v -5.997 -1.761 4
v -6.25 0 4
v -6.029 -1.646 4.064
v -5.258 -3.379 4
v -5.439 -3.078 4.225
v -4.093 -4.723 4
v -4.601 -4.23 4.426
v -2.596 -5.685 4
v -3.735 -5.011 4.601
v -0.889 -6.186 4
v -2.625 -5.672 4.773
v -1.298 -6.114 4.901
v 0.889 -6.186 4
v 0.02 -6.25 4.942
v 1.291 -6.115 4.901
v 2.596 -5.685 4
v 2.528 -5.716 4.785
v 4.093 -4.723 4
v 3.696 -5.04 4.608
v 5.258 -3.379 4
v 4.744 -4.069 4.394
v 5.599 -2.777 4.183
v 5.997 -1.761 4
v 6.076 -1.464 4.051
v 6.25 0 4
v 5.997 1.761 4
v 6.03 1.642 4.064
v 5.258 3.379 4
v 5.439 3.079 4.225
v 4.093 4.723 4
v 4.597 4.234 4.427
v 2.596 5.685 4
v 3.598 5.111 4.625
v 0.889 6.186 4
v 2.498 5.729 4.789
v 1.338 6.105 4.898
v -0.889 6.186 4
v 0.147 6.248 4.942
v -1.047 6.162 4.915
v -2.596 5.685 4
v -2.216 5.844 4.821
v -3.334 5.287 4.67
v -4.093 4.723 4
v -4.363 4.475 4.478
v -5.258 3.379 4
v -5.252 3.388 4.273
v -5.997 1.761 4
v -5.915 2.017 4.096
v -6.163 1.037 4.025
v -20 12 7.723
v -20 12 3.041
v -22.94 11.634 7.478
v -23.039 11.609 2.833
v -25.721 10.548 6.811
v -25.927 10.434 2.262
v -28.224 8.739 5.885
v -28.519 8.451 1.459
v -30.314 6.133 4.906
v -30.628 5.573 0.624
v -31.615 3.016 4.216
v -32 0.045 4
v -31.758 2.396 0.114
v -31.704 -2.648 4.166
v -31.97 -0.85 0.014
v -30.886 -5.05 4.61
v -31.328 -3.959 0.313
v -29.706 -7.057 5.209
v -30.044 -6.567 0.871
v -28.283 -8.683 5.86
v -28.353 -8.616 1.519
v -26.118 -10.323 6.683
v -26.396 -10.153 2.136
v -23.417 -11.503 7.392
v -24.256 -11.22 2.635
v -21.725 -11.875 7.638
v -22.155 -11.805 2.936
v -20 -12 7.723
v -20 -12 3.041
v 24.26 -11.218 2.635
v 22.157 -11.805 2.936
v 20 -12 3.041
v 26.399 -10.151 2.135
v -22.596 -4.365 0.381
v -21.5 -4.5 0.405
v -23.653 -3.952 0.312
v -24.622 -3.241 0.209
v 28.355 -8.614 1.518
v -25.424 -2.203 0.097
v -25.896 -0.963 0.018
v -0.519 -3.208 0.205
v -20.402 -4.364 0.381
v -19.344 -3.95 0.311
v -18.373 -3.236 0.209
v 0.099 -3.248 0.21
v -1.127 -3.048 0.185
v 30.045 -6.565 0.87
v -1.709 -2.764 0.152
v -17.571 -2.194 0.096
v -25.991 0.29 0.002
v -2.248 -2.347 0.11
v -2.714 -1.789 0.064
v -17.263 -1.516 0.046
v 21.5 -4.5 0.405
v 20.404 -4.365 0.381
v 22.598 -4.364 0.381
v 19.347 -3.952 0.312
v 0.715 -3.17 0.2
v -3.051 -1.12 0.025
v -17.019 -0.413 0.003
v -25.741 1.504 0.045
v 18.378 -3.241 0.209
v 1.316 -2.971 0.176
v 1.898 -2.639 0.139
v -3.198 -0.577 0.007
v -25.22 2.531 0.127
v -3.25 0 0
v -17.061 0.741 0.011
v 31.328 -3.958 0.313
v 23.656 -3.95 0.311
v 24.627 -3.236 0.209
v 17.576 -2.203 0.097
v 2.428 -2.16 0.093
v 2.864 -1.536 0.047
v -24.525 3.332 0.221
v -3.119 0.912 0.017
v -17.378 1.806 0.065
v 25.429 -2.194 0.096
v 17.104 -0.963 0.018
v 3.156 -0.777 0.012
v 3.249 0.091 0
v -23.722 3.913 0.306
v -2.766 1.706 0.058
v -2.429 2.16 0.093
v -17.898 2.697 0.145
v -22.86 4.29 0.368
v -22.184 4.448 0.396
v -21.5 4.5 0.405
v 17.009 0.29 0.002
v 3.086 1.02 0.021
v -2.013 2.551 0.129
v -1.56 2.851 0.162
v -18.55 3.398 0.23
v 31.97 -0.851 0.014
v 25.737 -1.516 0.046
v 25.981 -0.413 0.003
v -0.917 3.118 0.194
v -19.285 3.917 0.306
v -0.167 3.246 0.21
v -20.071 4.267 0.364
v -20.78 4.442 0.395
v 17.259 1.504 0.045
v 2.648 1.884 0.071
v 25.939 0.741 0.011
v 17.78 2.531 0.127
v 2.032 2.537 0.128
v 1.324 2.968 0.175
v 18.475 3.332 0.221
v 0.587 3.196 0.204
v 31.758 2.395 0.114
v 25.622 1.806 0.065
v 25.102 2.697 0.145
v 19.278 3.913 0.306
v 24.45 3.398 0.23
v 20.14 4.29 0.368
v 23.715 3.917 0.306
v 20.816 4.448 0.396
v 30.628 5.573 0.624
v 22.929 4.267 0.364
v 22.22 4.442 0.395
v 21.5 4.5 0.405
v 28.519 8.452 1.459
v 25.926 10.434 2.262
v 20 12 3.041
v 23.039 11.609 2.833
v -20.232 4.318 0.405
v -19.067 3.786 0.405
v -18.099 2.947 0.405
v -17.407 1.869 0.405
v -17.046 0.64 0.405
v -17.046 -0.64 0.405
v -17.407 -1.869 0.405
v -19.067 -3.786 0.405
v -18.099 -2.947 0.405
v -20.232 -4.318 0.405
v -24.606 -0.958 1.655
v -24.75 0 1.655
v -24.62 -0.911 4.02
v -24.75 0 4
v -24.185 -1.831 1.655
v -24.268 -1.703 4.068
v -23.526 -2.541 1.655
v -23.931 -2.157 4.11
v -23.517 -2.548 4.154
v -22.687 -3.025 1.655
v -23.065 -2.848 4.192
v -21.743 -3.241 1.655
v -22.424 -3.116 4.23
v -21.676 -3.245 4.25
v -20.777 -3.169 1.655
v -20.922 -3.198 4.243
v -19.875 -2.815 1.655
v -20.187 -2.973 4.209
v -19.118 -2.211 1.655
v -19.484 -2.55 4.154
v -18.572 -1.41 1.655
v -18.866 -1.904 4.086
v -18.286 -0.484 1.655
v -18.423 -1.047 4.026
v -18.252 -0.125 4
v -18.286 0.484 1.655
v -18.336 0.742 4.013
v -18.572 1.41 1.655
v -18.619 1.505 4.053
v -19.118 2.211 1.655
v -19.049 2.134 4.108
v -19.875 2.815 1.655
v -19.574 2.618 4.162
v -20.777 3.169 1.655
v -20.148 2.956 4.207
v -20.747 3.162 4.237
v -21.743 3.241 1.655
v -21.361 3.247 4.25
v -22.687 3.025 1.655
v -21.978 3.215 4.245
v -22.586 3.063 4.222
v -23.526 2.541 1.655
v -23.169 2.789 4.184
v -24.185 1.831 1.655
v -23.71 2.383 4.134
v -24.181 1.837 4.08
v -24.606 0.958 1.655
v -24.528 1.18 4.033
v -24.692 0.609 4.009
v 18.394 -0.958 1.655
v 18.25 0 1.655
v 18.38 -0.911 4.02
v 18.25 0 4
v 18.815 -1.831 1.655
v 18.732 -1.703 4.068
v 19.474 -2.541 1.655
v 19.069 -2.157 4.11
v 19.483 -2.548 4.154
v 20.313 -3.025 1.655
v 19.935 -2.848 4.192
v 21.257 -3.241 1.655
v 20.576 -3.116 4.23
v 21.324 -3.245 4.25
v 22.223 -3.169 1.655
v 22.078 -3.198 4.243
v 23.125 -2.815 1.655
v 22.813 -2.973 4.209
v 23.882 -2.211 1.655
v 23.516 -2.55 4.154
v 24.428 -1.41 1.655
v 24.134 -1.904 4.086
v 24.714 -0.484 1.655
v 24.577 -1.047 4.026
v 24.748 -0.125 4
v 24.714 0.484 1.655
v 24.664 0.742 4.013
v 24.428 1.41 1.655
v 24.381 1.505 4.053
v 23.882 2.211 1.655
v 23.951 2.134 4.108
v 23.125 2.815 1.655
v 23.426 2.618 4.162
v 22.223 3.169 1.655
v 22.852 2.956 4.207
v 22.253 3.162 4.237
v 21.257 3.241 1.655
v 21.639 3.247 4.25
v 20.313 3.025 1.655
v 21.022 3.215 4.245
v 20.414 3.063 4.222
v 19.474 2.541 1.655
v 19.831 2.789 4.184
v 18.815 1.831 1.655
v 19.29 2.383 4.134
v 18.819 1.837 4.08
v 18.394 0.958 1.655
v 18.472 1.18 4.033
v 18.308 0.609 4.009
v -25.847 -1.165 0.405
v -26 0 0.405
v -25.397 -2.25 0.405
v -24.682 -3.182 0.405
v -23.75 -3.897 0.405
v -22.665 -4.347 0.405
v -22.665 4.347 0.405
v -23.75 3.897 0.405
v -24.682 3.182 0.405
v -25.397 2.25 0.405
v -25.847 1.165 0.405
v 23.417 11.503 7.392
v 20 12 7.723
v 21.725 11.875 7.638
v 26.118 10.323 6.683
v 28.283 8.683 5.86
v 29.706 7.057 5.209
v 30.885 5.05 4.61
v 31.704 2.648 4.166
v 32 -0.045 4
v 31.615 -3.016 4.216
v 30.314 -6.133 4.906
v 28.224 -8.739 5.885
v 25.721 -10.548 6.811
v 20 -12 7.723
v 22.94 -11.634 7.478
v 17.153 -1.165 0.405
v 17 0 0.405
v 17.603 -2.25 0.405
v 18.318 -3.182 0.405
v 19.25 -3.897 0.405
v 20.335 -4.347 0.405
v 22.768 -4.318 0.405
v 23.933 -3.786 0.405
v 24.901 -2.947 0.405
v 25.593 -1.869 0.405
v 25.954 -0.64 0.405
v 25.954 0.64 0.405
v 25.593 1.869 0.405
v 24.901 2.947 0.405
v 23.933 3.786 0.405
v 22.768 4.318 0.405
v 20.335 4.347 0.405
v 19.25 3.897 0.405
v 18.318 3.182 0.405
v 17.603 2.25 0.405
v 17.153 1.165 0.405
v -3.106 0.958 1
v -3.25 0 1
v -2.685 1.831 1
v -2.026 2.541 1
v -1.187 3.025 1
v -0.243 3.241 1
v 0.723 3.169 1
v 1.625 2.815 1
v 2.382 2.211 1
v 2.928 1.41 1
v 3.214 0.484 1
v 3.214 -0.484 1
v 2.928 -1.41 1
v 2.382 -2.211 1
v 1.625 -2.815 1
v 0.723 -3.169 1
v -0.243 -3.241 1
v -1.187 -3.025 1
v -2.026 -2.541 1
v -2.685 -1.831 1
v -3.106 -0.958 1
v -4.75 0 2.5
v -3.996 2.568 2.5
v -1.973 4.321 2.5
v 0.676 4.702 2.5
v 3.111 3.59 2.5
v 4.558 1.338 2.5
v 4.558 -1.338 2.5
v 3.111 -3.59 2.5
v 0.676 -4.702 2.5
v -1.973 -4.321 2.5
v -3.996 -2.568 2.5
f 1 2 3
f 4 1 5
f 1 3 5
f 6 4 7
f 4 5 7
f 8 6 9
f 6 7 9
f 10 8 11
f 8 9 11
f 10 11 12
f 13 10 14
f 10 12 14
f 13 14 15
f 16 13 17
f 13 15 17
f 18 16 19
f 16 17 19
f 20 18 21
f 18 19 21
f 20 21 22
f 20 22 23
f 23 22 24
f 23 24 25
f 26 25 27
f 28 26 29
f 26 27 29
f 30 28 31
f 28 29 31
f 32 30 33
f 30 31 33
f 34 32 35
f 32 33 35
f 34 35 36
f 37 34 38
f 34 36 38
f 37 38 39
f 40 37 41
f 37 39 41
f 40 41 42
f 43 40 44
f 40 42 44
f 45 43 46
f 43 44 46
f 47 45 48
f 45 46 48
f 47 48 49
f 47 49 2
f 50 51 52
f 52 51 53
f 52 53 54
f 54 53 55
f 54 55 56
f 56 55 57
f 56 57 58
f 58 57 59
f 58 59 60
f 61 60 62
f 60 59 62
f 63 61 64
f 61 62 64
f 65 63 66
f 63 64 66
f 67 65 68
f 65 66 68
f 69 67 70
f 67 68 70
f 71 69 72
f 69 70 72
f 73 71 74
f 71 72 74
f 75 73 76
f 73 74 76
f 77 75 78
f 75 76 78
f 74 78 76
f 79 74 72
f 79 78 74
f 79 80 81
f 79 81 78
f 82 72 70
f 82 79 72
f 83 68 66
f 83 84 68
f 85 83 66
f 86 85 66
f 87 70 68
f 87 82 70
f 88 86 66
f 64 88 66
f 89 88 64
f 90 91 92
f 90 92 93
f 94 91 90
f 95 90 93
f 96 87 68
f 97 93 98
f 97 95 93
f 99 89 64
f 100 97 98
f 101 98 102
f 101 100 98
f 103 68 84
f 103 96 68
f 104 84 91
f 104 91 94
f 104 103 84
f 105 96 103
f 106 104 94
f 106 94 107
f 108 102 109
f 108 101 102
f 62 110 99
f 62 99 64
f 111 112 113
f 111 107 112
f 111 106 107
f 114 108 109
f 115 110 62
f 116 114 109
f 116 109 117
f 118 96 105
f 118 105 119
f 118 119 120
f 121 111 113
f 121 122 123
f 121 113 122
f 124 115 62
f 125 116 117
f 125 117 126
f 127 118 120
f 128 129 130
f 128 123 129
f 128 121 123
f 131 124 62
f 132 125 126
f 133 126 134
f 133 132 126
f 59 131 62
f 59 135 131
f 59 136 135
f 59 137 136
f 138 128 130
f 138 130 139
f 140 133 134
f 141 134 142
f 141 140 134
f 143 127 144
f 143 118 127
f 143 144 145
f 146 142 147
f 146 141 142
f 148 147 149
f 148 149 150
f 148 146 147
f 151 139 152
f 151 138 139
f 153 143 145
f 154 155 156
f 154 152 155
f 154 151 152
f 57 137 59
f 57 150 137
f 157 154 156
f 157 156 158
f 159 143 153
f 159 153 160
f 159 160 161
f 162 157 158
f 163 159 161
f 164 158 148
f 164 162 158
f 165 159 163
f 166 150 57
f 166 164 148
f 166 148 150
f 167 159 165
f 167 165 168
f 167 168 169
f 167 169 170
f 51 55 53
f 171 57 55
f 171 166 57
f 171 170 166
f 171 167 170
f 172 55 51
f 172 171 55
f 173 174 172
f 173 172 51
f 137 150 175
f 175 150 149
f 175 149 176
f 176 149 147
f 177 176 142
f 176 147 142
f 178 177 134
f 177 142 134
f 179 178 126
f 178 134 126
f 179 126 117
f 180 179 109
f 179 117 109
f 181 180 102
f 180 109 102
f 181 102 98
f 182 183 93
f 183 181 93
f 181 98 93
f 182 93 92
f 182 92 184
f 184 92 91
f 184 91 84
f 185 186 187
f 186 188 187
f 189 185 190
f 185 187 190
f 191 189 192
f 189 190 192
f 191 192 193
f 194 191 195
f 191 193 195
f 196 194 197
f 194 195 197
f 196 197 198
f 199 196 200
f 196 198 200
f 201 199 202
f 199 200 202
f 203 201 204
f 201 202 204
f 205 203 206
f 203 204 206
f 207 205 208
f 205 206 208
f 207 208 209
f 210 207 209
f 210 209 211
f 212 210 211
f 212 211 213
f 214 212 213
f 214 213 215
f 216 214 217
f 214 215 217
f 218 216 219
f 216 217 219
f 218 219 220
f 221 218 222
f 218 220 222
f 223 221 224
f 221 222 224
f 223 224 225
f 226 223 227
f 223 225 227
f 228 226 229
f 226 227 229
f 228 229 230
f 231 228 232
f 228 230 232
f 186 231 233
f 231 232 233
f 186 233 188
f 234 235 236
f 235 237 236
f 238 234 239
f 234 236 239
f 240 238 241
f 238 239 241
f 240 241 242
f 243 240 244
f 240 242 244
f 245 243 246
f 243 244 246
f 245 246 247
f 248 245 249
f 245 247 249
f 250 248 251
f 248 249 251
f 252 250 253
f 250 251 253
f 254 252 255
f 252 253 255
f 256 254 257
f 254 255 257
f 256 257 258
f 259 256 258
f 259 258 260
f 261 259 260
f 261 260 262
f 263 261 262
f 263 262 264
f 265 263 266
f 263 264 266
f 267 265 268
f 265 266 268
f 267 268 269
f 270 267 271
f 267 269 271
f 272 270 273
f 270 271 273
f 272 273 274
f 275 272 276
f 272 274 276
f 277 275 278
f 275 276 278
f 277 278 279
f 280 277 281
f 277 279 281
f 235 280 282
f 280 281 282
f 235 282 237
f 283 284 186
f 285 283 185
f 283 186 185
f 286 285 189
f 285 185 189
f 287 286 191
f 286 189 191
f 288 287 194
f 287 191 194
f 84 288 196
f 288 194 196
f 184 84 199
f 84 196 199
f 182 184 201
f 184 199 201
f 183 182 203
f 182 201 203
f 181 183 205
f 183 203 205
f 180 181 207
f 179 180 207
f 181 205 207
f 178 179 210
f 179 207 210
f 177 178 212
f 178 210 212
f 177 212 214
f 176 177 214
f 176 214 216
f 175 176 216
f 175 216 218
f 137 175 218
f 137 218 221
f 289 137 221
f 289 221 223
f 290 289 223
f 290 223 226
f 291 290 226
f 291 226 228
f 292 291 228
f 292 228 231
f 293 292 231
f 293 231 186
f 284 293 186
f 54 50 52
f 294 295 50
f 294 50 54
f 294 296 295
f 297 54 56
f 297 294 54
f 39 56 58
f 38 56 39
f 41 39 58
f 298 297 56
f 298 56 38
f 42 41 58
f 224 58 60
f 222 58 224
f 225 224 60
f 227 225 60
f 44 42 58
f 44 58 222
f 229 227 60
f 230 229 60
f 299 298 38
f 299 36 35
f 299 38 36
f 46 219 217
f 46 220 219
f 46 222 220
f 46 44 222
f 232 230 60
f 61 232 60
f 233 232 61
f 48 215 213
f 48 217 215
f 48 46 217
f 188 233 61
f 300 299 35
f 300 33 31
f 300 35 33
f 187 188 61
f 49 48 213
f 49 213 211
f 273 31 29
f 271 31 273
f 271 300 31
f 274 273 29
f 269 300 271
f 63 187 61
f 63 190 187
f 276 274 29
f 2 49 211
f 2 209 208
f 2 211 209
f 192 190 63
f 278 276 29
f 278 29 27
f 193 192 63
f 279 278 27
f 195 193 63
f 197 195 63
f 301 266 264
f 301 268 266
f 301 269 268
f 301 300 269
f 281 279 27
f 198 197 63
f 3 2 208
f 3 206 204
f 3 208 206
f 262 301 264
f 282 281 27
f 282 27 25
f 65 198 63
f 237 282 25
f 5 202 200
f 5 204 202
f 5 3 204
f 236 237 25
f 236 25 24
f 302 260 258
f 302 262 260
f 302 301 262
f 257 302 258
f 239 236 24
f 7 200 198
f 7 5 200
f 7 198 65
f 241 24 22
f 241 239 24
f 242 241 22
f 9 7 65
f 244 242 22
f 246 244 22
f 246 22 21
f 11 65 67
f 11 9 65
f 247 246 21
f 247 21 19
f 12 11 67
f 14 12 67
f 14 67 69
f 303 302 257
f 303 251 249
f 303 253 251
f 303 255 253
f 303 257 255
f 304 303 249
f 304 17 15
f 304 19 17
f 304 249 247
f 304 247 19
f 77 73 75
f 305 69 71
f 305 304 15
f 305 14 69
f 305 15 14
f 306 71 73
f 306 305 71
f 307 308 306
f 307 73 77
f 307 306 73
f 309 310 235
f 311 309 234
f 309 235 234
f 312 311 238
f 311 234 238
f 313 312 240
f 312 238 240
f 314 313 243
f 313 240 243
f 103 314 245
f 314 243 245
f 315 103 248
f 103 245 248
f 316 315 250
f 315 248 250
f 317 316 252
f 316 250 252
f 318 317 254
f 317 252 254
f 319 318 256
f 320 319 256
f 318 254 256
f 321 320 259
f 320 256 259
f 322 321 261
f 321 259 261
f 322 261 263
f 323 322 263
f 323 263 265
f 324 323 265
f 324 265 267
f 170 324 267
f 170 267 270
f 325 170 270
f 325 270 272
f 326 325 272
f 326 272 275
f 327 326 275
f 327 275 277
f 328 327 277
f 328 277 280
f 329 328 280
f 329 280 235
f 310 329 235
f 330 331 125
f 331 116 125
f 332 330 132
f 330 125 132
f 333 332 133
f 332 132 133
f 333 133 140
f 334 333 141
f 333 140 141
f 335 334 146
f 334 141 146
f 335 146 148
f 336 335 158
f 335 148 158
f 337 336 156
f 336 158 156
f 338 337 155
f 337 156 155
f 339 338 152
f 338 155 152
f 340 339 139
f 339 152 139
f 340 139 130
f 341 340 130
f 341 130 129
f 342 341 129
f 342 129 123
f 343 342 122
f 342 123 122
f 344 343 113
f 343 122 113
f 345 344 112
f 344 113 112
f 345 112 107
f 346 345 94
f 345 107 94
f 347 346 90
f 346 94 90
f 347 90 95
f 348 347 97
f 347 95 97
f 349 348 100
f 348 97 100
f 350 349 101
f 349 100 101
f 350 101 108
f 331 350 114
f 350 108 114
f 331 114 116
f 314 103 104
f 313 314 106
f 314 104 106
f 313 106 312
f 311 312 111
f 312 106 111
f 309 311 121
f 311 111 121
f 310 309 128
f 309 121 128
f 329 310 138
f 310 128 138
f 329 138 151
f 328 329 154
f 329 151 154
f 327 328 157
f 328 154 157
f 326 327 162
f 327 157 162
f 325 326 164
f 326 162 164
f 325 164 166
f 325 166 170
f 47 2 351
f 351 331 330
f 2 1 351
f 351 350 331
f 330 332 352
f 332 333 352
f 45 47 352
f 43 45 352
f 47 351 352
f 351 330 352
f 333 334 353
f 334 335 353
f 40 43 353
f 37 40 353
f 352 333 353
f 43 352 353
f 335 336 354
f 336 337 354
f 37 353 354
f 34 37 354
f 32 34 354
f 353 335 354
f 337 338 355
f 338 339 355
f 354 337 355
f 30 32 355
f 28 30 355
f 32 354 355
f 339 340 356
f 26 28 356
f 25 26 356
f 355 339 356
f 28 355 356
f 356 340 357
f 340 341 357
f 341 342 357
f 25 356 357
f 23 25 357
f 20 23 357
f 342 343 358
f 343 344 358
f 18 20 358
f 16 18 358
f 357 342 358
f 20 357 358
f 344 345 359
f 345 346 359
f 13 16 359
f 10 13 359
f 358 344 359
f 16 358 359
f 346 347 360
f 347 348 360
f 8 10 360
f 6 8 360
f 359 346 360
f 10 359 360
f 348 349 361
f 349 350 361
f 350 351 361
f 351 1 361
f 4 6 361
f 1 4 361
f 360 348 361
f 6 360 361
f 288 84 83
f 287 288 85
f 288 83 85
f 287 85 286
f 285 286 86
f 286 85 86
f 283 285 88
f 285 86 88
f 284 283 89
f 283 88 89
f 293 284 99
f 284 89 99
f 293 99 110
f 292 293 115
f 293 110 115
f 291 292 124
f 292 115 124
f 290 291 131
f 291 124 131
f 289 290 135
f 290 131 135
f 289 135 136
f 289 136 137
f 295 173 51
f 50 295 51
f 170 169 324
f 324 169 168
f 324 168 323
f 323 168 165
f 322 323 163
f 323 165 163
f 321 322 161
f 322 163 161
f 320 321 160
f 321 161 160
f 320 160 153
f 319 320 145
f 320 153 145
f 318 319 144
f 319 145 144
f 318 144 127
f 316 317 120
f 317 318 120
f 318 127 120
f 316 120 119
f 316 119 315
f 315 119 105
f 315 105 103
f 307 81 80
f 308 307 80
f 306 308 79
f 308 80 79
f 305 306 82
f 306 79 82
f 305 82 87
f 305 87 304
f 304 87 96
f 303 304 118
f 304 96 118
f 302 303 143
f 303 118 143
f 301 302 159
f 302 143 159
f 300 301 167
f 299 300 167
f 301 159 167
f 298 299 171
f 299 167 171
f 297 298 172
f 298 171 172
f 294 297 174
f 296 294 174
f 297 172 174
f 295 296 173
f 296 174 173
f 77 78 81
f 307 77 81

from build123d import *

# Parameters (mm, degrees)
F1_DEPTH       = 20
F3_DEPTH       = 40
F5_D           = 6.5
F5_START       = 0.4050409
F5_CSINK_D     = 9
F5_CSINK_ANGLE = 90
F8_D           = 6.5
F8_START       = 1.0000001
F8_CSINK_D     = 12.5
F8_CSINK_ANGLE = 90


with BuildPart() as f1:
    # F0 (on Top) → F1 (new body)
    with BuildSketch(Plane.XY):
        with BuildLine():
            ThreePointArc((-20, 12), (-32, 0), (-20, -12))
            Line((-20, -12), (20, -12))
            ThreePointArc((20, -12), (32, 0), (20, 12))
            Line((20, 12), (-20, 12))
        make_face()
    extrude(amount=F1_DEPTH)

    # F2 (on Right) → F3 (intersect, symmetric)
    with BuildSketch(Plane.YZ):
        with BuildLine():
            ThreePointArc((15, 10.218678296), (0, 4), (-15, 10.218678296))
            Line((-15, 10.218678296), (-15, 4.9505555632))
            ThreePointArc((-15, 4.9505555632), (0, 0), (15, 4.9505555632))
            Line((15, 4.9505555632), (15, 10.218678296))
        make_face()
    extrude(amount=F3_DEPTH, both=True, mode=Mode.INTERSECT)

    # F5 (through all)
    # its depths count from where the whole tool has entered the part; down to there all is cleared
    with Locations(Plane(origin=(0, 0, 0), x_dir=(1, 0, 0), z_dir=(0, 0, -1)).offset(-F5_START)):
        with Locations((-21.5, 0), (21.5, 0)):
            CounterSinkHole(F5_D / 2, F5_CSINK_D / 2, counter_sink_angle=F5_CSINK_ANGLE)

    # F8 (through all)
    # its depths count from where the whole tool has entered the part; down to there all is cleared
    with Locations(Plane.XY.offset(5).offset(-F8_START)):
        with Locations((0, 0)):
            CounterSinkHole(F8_D / 2, F8_CSINK_D / 2, counter_sink_angle=F8_CSINK_ANGLE)


solid = f1.part
